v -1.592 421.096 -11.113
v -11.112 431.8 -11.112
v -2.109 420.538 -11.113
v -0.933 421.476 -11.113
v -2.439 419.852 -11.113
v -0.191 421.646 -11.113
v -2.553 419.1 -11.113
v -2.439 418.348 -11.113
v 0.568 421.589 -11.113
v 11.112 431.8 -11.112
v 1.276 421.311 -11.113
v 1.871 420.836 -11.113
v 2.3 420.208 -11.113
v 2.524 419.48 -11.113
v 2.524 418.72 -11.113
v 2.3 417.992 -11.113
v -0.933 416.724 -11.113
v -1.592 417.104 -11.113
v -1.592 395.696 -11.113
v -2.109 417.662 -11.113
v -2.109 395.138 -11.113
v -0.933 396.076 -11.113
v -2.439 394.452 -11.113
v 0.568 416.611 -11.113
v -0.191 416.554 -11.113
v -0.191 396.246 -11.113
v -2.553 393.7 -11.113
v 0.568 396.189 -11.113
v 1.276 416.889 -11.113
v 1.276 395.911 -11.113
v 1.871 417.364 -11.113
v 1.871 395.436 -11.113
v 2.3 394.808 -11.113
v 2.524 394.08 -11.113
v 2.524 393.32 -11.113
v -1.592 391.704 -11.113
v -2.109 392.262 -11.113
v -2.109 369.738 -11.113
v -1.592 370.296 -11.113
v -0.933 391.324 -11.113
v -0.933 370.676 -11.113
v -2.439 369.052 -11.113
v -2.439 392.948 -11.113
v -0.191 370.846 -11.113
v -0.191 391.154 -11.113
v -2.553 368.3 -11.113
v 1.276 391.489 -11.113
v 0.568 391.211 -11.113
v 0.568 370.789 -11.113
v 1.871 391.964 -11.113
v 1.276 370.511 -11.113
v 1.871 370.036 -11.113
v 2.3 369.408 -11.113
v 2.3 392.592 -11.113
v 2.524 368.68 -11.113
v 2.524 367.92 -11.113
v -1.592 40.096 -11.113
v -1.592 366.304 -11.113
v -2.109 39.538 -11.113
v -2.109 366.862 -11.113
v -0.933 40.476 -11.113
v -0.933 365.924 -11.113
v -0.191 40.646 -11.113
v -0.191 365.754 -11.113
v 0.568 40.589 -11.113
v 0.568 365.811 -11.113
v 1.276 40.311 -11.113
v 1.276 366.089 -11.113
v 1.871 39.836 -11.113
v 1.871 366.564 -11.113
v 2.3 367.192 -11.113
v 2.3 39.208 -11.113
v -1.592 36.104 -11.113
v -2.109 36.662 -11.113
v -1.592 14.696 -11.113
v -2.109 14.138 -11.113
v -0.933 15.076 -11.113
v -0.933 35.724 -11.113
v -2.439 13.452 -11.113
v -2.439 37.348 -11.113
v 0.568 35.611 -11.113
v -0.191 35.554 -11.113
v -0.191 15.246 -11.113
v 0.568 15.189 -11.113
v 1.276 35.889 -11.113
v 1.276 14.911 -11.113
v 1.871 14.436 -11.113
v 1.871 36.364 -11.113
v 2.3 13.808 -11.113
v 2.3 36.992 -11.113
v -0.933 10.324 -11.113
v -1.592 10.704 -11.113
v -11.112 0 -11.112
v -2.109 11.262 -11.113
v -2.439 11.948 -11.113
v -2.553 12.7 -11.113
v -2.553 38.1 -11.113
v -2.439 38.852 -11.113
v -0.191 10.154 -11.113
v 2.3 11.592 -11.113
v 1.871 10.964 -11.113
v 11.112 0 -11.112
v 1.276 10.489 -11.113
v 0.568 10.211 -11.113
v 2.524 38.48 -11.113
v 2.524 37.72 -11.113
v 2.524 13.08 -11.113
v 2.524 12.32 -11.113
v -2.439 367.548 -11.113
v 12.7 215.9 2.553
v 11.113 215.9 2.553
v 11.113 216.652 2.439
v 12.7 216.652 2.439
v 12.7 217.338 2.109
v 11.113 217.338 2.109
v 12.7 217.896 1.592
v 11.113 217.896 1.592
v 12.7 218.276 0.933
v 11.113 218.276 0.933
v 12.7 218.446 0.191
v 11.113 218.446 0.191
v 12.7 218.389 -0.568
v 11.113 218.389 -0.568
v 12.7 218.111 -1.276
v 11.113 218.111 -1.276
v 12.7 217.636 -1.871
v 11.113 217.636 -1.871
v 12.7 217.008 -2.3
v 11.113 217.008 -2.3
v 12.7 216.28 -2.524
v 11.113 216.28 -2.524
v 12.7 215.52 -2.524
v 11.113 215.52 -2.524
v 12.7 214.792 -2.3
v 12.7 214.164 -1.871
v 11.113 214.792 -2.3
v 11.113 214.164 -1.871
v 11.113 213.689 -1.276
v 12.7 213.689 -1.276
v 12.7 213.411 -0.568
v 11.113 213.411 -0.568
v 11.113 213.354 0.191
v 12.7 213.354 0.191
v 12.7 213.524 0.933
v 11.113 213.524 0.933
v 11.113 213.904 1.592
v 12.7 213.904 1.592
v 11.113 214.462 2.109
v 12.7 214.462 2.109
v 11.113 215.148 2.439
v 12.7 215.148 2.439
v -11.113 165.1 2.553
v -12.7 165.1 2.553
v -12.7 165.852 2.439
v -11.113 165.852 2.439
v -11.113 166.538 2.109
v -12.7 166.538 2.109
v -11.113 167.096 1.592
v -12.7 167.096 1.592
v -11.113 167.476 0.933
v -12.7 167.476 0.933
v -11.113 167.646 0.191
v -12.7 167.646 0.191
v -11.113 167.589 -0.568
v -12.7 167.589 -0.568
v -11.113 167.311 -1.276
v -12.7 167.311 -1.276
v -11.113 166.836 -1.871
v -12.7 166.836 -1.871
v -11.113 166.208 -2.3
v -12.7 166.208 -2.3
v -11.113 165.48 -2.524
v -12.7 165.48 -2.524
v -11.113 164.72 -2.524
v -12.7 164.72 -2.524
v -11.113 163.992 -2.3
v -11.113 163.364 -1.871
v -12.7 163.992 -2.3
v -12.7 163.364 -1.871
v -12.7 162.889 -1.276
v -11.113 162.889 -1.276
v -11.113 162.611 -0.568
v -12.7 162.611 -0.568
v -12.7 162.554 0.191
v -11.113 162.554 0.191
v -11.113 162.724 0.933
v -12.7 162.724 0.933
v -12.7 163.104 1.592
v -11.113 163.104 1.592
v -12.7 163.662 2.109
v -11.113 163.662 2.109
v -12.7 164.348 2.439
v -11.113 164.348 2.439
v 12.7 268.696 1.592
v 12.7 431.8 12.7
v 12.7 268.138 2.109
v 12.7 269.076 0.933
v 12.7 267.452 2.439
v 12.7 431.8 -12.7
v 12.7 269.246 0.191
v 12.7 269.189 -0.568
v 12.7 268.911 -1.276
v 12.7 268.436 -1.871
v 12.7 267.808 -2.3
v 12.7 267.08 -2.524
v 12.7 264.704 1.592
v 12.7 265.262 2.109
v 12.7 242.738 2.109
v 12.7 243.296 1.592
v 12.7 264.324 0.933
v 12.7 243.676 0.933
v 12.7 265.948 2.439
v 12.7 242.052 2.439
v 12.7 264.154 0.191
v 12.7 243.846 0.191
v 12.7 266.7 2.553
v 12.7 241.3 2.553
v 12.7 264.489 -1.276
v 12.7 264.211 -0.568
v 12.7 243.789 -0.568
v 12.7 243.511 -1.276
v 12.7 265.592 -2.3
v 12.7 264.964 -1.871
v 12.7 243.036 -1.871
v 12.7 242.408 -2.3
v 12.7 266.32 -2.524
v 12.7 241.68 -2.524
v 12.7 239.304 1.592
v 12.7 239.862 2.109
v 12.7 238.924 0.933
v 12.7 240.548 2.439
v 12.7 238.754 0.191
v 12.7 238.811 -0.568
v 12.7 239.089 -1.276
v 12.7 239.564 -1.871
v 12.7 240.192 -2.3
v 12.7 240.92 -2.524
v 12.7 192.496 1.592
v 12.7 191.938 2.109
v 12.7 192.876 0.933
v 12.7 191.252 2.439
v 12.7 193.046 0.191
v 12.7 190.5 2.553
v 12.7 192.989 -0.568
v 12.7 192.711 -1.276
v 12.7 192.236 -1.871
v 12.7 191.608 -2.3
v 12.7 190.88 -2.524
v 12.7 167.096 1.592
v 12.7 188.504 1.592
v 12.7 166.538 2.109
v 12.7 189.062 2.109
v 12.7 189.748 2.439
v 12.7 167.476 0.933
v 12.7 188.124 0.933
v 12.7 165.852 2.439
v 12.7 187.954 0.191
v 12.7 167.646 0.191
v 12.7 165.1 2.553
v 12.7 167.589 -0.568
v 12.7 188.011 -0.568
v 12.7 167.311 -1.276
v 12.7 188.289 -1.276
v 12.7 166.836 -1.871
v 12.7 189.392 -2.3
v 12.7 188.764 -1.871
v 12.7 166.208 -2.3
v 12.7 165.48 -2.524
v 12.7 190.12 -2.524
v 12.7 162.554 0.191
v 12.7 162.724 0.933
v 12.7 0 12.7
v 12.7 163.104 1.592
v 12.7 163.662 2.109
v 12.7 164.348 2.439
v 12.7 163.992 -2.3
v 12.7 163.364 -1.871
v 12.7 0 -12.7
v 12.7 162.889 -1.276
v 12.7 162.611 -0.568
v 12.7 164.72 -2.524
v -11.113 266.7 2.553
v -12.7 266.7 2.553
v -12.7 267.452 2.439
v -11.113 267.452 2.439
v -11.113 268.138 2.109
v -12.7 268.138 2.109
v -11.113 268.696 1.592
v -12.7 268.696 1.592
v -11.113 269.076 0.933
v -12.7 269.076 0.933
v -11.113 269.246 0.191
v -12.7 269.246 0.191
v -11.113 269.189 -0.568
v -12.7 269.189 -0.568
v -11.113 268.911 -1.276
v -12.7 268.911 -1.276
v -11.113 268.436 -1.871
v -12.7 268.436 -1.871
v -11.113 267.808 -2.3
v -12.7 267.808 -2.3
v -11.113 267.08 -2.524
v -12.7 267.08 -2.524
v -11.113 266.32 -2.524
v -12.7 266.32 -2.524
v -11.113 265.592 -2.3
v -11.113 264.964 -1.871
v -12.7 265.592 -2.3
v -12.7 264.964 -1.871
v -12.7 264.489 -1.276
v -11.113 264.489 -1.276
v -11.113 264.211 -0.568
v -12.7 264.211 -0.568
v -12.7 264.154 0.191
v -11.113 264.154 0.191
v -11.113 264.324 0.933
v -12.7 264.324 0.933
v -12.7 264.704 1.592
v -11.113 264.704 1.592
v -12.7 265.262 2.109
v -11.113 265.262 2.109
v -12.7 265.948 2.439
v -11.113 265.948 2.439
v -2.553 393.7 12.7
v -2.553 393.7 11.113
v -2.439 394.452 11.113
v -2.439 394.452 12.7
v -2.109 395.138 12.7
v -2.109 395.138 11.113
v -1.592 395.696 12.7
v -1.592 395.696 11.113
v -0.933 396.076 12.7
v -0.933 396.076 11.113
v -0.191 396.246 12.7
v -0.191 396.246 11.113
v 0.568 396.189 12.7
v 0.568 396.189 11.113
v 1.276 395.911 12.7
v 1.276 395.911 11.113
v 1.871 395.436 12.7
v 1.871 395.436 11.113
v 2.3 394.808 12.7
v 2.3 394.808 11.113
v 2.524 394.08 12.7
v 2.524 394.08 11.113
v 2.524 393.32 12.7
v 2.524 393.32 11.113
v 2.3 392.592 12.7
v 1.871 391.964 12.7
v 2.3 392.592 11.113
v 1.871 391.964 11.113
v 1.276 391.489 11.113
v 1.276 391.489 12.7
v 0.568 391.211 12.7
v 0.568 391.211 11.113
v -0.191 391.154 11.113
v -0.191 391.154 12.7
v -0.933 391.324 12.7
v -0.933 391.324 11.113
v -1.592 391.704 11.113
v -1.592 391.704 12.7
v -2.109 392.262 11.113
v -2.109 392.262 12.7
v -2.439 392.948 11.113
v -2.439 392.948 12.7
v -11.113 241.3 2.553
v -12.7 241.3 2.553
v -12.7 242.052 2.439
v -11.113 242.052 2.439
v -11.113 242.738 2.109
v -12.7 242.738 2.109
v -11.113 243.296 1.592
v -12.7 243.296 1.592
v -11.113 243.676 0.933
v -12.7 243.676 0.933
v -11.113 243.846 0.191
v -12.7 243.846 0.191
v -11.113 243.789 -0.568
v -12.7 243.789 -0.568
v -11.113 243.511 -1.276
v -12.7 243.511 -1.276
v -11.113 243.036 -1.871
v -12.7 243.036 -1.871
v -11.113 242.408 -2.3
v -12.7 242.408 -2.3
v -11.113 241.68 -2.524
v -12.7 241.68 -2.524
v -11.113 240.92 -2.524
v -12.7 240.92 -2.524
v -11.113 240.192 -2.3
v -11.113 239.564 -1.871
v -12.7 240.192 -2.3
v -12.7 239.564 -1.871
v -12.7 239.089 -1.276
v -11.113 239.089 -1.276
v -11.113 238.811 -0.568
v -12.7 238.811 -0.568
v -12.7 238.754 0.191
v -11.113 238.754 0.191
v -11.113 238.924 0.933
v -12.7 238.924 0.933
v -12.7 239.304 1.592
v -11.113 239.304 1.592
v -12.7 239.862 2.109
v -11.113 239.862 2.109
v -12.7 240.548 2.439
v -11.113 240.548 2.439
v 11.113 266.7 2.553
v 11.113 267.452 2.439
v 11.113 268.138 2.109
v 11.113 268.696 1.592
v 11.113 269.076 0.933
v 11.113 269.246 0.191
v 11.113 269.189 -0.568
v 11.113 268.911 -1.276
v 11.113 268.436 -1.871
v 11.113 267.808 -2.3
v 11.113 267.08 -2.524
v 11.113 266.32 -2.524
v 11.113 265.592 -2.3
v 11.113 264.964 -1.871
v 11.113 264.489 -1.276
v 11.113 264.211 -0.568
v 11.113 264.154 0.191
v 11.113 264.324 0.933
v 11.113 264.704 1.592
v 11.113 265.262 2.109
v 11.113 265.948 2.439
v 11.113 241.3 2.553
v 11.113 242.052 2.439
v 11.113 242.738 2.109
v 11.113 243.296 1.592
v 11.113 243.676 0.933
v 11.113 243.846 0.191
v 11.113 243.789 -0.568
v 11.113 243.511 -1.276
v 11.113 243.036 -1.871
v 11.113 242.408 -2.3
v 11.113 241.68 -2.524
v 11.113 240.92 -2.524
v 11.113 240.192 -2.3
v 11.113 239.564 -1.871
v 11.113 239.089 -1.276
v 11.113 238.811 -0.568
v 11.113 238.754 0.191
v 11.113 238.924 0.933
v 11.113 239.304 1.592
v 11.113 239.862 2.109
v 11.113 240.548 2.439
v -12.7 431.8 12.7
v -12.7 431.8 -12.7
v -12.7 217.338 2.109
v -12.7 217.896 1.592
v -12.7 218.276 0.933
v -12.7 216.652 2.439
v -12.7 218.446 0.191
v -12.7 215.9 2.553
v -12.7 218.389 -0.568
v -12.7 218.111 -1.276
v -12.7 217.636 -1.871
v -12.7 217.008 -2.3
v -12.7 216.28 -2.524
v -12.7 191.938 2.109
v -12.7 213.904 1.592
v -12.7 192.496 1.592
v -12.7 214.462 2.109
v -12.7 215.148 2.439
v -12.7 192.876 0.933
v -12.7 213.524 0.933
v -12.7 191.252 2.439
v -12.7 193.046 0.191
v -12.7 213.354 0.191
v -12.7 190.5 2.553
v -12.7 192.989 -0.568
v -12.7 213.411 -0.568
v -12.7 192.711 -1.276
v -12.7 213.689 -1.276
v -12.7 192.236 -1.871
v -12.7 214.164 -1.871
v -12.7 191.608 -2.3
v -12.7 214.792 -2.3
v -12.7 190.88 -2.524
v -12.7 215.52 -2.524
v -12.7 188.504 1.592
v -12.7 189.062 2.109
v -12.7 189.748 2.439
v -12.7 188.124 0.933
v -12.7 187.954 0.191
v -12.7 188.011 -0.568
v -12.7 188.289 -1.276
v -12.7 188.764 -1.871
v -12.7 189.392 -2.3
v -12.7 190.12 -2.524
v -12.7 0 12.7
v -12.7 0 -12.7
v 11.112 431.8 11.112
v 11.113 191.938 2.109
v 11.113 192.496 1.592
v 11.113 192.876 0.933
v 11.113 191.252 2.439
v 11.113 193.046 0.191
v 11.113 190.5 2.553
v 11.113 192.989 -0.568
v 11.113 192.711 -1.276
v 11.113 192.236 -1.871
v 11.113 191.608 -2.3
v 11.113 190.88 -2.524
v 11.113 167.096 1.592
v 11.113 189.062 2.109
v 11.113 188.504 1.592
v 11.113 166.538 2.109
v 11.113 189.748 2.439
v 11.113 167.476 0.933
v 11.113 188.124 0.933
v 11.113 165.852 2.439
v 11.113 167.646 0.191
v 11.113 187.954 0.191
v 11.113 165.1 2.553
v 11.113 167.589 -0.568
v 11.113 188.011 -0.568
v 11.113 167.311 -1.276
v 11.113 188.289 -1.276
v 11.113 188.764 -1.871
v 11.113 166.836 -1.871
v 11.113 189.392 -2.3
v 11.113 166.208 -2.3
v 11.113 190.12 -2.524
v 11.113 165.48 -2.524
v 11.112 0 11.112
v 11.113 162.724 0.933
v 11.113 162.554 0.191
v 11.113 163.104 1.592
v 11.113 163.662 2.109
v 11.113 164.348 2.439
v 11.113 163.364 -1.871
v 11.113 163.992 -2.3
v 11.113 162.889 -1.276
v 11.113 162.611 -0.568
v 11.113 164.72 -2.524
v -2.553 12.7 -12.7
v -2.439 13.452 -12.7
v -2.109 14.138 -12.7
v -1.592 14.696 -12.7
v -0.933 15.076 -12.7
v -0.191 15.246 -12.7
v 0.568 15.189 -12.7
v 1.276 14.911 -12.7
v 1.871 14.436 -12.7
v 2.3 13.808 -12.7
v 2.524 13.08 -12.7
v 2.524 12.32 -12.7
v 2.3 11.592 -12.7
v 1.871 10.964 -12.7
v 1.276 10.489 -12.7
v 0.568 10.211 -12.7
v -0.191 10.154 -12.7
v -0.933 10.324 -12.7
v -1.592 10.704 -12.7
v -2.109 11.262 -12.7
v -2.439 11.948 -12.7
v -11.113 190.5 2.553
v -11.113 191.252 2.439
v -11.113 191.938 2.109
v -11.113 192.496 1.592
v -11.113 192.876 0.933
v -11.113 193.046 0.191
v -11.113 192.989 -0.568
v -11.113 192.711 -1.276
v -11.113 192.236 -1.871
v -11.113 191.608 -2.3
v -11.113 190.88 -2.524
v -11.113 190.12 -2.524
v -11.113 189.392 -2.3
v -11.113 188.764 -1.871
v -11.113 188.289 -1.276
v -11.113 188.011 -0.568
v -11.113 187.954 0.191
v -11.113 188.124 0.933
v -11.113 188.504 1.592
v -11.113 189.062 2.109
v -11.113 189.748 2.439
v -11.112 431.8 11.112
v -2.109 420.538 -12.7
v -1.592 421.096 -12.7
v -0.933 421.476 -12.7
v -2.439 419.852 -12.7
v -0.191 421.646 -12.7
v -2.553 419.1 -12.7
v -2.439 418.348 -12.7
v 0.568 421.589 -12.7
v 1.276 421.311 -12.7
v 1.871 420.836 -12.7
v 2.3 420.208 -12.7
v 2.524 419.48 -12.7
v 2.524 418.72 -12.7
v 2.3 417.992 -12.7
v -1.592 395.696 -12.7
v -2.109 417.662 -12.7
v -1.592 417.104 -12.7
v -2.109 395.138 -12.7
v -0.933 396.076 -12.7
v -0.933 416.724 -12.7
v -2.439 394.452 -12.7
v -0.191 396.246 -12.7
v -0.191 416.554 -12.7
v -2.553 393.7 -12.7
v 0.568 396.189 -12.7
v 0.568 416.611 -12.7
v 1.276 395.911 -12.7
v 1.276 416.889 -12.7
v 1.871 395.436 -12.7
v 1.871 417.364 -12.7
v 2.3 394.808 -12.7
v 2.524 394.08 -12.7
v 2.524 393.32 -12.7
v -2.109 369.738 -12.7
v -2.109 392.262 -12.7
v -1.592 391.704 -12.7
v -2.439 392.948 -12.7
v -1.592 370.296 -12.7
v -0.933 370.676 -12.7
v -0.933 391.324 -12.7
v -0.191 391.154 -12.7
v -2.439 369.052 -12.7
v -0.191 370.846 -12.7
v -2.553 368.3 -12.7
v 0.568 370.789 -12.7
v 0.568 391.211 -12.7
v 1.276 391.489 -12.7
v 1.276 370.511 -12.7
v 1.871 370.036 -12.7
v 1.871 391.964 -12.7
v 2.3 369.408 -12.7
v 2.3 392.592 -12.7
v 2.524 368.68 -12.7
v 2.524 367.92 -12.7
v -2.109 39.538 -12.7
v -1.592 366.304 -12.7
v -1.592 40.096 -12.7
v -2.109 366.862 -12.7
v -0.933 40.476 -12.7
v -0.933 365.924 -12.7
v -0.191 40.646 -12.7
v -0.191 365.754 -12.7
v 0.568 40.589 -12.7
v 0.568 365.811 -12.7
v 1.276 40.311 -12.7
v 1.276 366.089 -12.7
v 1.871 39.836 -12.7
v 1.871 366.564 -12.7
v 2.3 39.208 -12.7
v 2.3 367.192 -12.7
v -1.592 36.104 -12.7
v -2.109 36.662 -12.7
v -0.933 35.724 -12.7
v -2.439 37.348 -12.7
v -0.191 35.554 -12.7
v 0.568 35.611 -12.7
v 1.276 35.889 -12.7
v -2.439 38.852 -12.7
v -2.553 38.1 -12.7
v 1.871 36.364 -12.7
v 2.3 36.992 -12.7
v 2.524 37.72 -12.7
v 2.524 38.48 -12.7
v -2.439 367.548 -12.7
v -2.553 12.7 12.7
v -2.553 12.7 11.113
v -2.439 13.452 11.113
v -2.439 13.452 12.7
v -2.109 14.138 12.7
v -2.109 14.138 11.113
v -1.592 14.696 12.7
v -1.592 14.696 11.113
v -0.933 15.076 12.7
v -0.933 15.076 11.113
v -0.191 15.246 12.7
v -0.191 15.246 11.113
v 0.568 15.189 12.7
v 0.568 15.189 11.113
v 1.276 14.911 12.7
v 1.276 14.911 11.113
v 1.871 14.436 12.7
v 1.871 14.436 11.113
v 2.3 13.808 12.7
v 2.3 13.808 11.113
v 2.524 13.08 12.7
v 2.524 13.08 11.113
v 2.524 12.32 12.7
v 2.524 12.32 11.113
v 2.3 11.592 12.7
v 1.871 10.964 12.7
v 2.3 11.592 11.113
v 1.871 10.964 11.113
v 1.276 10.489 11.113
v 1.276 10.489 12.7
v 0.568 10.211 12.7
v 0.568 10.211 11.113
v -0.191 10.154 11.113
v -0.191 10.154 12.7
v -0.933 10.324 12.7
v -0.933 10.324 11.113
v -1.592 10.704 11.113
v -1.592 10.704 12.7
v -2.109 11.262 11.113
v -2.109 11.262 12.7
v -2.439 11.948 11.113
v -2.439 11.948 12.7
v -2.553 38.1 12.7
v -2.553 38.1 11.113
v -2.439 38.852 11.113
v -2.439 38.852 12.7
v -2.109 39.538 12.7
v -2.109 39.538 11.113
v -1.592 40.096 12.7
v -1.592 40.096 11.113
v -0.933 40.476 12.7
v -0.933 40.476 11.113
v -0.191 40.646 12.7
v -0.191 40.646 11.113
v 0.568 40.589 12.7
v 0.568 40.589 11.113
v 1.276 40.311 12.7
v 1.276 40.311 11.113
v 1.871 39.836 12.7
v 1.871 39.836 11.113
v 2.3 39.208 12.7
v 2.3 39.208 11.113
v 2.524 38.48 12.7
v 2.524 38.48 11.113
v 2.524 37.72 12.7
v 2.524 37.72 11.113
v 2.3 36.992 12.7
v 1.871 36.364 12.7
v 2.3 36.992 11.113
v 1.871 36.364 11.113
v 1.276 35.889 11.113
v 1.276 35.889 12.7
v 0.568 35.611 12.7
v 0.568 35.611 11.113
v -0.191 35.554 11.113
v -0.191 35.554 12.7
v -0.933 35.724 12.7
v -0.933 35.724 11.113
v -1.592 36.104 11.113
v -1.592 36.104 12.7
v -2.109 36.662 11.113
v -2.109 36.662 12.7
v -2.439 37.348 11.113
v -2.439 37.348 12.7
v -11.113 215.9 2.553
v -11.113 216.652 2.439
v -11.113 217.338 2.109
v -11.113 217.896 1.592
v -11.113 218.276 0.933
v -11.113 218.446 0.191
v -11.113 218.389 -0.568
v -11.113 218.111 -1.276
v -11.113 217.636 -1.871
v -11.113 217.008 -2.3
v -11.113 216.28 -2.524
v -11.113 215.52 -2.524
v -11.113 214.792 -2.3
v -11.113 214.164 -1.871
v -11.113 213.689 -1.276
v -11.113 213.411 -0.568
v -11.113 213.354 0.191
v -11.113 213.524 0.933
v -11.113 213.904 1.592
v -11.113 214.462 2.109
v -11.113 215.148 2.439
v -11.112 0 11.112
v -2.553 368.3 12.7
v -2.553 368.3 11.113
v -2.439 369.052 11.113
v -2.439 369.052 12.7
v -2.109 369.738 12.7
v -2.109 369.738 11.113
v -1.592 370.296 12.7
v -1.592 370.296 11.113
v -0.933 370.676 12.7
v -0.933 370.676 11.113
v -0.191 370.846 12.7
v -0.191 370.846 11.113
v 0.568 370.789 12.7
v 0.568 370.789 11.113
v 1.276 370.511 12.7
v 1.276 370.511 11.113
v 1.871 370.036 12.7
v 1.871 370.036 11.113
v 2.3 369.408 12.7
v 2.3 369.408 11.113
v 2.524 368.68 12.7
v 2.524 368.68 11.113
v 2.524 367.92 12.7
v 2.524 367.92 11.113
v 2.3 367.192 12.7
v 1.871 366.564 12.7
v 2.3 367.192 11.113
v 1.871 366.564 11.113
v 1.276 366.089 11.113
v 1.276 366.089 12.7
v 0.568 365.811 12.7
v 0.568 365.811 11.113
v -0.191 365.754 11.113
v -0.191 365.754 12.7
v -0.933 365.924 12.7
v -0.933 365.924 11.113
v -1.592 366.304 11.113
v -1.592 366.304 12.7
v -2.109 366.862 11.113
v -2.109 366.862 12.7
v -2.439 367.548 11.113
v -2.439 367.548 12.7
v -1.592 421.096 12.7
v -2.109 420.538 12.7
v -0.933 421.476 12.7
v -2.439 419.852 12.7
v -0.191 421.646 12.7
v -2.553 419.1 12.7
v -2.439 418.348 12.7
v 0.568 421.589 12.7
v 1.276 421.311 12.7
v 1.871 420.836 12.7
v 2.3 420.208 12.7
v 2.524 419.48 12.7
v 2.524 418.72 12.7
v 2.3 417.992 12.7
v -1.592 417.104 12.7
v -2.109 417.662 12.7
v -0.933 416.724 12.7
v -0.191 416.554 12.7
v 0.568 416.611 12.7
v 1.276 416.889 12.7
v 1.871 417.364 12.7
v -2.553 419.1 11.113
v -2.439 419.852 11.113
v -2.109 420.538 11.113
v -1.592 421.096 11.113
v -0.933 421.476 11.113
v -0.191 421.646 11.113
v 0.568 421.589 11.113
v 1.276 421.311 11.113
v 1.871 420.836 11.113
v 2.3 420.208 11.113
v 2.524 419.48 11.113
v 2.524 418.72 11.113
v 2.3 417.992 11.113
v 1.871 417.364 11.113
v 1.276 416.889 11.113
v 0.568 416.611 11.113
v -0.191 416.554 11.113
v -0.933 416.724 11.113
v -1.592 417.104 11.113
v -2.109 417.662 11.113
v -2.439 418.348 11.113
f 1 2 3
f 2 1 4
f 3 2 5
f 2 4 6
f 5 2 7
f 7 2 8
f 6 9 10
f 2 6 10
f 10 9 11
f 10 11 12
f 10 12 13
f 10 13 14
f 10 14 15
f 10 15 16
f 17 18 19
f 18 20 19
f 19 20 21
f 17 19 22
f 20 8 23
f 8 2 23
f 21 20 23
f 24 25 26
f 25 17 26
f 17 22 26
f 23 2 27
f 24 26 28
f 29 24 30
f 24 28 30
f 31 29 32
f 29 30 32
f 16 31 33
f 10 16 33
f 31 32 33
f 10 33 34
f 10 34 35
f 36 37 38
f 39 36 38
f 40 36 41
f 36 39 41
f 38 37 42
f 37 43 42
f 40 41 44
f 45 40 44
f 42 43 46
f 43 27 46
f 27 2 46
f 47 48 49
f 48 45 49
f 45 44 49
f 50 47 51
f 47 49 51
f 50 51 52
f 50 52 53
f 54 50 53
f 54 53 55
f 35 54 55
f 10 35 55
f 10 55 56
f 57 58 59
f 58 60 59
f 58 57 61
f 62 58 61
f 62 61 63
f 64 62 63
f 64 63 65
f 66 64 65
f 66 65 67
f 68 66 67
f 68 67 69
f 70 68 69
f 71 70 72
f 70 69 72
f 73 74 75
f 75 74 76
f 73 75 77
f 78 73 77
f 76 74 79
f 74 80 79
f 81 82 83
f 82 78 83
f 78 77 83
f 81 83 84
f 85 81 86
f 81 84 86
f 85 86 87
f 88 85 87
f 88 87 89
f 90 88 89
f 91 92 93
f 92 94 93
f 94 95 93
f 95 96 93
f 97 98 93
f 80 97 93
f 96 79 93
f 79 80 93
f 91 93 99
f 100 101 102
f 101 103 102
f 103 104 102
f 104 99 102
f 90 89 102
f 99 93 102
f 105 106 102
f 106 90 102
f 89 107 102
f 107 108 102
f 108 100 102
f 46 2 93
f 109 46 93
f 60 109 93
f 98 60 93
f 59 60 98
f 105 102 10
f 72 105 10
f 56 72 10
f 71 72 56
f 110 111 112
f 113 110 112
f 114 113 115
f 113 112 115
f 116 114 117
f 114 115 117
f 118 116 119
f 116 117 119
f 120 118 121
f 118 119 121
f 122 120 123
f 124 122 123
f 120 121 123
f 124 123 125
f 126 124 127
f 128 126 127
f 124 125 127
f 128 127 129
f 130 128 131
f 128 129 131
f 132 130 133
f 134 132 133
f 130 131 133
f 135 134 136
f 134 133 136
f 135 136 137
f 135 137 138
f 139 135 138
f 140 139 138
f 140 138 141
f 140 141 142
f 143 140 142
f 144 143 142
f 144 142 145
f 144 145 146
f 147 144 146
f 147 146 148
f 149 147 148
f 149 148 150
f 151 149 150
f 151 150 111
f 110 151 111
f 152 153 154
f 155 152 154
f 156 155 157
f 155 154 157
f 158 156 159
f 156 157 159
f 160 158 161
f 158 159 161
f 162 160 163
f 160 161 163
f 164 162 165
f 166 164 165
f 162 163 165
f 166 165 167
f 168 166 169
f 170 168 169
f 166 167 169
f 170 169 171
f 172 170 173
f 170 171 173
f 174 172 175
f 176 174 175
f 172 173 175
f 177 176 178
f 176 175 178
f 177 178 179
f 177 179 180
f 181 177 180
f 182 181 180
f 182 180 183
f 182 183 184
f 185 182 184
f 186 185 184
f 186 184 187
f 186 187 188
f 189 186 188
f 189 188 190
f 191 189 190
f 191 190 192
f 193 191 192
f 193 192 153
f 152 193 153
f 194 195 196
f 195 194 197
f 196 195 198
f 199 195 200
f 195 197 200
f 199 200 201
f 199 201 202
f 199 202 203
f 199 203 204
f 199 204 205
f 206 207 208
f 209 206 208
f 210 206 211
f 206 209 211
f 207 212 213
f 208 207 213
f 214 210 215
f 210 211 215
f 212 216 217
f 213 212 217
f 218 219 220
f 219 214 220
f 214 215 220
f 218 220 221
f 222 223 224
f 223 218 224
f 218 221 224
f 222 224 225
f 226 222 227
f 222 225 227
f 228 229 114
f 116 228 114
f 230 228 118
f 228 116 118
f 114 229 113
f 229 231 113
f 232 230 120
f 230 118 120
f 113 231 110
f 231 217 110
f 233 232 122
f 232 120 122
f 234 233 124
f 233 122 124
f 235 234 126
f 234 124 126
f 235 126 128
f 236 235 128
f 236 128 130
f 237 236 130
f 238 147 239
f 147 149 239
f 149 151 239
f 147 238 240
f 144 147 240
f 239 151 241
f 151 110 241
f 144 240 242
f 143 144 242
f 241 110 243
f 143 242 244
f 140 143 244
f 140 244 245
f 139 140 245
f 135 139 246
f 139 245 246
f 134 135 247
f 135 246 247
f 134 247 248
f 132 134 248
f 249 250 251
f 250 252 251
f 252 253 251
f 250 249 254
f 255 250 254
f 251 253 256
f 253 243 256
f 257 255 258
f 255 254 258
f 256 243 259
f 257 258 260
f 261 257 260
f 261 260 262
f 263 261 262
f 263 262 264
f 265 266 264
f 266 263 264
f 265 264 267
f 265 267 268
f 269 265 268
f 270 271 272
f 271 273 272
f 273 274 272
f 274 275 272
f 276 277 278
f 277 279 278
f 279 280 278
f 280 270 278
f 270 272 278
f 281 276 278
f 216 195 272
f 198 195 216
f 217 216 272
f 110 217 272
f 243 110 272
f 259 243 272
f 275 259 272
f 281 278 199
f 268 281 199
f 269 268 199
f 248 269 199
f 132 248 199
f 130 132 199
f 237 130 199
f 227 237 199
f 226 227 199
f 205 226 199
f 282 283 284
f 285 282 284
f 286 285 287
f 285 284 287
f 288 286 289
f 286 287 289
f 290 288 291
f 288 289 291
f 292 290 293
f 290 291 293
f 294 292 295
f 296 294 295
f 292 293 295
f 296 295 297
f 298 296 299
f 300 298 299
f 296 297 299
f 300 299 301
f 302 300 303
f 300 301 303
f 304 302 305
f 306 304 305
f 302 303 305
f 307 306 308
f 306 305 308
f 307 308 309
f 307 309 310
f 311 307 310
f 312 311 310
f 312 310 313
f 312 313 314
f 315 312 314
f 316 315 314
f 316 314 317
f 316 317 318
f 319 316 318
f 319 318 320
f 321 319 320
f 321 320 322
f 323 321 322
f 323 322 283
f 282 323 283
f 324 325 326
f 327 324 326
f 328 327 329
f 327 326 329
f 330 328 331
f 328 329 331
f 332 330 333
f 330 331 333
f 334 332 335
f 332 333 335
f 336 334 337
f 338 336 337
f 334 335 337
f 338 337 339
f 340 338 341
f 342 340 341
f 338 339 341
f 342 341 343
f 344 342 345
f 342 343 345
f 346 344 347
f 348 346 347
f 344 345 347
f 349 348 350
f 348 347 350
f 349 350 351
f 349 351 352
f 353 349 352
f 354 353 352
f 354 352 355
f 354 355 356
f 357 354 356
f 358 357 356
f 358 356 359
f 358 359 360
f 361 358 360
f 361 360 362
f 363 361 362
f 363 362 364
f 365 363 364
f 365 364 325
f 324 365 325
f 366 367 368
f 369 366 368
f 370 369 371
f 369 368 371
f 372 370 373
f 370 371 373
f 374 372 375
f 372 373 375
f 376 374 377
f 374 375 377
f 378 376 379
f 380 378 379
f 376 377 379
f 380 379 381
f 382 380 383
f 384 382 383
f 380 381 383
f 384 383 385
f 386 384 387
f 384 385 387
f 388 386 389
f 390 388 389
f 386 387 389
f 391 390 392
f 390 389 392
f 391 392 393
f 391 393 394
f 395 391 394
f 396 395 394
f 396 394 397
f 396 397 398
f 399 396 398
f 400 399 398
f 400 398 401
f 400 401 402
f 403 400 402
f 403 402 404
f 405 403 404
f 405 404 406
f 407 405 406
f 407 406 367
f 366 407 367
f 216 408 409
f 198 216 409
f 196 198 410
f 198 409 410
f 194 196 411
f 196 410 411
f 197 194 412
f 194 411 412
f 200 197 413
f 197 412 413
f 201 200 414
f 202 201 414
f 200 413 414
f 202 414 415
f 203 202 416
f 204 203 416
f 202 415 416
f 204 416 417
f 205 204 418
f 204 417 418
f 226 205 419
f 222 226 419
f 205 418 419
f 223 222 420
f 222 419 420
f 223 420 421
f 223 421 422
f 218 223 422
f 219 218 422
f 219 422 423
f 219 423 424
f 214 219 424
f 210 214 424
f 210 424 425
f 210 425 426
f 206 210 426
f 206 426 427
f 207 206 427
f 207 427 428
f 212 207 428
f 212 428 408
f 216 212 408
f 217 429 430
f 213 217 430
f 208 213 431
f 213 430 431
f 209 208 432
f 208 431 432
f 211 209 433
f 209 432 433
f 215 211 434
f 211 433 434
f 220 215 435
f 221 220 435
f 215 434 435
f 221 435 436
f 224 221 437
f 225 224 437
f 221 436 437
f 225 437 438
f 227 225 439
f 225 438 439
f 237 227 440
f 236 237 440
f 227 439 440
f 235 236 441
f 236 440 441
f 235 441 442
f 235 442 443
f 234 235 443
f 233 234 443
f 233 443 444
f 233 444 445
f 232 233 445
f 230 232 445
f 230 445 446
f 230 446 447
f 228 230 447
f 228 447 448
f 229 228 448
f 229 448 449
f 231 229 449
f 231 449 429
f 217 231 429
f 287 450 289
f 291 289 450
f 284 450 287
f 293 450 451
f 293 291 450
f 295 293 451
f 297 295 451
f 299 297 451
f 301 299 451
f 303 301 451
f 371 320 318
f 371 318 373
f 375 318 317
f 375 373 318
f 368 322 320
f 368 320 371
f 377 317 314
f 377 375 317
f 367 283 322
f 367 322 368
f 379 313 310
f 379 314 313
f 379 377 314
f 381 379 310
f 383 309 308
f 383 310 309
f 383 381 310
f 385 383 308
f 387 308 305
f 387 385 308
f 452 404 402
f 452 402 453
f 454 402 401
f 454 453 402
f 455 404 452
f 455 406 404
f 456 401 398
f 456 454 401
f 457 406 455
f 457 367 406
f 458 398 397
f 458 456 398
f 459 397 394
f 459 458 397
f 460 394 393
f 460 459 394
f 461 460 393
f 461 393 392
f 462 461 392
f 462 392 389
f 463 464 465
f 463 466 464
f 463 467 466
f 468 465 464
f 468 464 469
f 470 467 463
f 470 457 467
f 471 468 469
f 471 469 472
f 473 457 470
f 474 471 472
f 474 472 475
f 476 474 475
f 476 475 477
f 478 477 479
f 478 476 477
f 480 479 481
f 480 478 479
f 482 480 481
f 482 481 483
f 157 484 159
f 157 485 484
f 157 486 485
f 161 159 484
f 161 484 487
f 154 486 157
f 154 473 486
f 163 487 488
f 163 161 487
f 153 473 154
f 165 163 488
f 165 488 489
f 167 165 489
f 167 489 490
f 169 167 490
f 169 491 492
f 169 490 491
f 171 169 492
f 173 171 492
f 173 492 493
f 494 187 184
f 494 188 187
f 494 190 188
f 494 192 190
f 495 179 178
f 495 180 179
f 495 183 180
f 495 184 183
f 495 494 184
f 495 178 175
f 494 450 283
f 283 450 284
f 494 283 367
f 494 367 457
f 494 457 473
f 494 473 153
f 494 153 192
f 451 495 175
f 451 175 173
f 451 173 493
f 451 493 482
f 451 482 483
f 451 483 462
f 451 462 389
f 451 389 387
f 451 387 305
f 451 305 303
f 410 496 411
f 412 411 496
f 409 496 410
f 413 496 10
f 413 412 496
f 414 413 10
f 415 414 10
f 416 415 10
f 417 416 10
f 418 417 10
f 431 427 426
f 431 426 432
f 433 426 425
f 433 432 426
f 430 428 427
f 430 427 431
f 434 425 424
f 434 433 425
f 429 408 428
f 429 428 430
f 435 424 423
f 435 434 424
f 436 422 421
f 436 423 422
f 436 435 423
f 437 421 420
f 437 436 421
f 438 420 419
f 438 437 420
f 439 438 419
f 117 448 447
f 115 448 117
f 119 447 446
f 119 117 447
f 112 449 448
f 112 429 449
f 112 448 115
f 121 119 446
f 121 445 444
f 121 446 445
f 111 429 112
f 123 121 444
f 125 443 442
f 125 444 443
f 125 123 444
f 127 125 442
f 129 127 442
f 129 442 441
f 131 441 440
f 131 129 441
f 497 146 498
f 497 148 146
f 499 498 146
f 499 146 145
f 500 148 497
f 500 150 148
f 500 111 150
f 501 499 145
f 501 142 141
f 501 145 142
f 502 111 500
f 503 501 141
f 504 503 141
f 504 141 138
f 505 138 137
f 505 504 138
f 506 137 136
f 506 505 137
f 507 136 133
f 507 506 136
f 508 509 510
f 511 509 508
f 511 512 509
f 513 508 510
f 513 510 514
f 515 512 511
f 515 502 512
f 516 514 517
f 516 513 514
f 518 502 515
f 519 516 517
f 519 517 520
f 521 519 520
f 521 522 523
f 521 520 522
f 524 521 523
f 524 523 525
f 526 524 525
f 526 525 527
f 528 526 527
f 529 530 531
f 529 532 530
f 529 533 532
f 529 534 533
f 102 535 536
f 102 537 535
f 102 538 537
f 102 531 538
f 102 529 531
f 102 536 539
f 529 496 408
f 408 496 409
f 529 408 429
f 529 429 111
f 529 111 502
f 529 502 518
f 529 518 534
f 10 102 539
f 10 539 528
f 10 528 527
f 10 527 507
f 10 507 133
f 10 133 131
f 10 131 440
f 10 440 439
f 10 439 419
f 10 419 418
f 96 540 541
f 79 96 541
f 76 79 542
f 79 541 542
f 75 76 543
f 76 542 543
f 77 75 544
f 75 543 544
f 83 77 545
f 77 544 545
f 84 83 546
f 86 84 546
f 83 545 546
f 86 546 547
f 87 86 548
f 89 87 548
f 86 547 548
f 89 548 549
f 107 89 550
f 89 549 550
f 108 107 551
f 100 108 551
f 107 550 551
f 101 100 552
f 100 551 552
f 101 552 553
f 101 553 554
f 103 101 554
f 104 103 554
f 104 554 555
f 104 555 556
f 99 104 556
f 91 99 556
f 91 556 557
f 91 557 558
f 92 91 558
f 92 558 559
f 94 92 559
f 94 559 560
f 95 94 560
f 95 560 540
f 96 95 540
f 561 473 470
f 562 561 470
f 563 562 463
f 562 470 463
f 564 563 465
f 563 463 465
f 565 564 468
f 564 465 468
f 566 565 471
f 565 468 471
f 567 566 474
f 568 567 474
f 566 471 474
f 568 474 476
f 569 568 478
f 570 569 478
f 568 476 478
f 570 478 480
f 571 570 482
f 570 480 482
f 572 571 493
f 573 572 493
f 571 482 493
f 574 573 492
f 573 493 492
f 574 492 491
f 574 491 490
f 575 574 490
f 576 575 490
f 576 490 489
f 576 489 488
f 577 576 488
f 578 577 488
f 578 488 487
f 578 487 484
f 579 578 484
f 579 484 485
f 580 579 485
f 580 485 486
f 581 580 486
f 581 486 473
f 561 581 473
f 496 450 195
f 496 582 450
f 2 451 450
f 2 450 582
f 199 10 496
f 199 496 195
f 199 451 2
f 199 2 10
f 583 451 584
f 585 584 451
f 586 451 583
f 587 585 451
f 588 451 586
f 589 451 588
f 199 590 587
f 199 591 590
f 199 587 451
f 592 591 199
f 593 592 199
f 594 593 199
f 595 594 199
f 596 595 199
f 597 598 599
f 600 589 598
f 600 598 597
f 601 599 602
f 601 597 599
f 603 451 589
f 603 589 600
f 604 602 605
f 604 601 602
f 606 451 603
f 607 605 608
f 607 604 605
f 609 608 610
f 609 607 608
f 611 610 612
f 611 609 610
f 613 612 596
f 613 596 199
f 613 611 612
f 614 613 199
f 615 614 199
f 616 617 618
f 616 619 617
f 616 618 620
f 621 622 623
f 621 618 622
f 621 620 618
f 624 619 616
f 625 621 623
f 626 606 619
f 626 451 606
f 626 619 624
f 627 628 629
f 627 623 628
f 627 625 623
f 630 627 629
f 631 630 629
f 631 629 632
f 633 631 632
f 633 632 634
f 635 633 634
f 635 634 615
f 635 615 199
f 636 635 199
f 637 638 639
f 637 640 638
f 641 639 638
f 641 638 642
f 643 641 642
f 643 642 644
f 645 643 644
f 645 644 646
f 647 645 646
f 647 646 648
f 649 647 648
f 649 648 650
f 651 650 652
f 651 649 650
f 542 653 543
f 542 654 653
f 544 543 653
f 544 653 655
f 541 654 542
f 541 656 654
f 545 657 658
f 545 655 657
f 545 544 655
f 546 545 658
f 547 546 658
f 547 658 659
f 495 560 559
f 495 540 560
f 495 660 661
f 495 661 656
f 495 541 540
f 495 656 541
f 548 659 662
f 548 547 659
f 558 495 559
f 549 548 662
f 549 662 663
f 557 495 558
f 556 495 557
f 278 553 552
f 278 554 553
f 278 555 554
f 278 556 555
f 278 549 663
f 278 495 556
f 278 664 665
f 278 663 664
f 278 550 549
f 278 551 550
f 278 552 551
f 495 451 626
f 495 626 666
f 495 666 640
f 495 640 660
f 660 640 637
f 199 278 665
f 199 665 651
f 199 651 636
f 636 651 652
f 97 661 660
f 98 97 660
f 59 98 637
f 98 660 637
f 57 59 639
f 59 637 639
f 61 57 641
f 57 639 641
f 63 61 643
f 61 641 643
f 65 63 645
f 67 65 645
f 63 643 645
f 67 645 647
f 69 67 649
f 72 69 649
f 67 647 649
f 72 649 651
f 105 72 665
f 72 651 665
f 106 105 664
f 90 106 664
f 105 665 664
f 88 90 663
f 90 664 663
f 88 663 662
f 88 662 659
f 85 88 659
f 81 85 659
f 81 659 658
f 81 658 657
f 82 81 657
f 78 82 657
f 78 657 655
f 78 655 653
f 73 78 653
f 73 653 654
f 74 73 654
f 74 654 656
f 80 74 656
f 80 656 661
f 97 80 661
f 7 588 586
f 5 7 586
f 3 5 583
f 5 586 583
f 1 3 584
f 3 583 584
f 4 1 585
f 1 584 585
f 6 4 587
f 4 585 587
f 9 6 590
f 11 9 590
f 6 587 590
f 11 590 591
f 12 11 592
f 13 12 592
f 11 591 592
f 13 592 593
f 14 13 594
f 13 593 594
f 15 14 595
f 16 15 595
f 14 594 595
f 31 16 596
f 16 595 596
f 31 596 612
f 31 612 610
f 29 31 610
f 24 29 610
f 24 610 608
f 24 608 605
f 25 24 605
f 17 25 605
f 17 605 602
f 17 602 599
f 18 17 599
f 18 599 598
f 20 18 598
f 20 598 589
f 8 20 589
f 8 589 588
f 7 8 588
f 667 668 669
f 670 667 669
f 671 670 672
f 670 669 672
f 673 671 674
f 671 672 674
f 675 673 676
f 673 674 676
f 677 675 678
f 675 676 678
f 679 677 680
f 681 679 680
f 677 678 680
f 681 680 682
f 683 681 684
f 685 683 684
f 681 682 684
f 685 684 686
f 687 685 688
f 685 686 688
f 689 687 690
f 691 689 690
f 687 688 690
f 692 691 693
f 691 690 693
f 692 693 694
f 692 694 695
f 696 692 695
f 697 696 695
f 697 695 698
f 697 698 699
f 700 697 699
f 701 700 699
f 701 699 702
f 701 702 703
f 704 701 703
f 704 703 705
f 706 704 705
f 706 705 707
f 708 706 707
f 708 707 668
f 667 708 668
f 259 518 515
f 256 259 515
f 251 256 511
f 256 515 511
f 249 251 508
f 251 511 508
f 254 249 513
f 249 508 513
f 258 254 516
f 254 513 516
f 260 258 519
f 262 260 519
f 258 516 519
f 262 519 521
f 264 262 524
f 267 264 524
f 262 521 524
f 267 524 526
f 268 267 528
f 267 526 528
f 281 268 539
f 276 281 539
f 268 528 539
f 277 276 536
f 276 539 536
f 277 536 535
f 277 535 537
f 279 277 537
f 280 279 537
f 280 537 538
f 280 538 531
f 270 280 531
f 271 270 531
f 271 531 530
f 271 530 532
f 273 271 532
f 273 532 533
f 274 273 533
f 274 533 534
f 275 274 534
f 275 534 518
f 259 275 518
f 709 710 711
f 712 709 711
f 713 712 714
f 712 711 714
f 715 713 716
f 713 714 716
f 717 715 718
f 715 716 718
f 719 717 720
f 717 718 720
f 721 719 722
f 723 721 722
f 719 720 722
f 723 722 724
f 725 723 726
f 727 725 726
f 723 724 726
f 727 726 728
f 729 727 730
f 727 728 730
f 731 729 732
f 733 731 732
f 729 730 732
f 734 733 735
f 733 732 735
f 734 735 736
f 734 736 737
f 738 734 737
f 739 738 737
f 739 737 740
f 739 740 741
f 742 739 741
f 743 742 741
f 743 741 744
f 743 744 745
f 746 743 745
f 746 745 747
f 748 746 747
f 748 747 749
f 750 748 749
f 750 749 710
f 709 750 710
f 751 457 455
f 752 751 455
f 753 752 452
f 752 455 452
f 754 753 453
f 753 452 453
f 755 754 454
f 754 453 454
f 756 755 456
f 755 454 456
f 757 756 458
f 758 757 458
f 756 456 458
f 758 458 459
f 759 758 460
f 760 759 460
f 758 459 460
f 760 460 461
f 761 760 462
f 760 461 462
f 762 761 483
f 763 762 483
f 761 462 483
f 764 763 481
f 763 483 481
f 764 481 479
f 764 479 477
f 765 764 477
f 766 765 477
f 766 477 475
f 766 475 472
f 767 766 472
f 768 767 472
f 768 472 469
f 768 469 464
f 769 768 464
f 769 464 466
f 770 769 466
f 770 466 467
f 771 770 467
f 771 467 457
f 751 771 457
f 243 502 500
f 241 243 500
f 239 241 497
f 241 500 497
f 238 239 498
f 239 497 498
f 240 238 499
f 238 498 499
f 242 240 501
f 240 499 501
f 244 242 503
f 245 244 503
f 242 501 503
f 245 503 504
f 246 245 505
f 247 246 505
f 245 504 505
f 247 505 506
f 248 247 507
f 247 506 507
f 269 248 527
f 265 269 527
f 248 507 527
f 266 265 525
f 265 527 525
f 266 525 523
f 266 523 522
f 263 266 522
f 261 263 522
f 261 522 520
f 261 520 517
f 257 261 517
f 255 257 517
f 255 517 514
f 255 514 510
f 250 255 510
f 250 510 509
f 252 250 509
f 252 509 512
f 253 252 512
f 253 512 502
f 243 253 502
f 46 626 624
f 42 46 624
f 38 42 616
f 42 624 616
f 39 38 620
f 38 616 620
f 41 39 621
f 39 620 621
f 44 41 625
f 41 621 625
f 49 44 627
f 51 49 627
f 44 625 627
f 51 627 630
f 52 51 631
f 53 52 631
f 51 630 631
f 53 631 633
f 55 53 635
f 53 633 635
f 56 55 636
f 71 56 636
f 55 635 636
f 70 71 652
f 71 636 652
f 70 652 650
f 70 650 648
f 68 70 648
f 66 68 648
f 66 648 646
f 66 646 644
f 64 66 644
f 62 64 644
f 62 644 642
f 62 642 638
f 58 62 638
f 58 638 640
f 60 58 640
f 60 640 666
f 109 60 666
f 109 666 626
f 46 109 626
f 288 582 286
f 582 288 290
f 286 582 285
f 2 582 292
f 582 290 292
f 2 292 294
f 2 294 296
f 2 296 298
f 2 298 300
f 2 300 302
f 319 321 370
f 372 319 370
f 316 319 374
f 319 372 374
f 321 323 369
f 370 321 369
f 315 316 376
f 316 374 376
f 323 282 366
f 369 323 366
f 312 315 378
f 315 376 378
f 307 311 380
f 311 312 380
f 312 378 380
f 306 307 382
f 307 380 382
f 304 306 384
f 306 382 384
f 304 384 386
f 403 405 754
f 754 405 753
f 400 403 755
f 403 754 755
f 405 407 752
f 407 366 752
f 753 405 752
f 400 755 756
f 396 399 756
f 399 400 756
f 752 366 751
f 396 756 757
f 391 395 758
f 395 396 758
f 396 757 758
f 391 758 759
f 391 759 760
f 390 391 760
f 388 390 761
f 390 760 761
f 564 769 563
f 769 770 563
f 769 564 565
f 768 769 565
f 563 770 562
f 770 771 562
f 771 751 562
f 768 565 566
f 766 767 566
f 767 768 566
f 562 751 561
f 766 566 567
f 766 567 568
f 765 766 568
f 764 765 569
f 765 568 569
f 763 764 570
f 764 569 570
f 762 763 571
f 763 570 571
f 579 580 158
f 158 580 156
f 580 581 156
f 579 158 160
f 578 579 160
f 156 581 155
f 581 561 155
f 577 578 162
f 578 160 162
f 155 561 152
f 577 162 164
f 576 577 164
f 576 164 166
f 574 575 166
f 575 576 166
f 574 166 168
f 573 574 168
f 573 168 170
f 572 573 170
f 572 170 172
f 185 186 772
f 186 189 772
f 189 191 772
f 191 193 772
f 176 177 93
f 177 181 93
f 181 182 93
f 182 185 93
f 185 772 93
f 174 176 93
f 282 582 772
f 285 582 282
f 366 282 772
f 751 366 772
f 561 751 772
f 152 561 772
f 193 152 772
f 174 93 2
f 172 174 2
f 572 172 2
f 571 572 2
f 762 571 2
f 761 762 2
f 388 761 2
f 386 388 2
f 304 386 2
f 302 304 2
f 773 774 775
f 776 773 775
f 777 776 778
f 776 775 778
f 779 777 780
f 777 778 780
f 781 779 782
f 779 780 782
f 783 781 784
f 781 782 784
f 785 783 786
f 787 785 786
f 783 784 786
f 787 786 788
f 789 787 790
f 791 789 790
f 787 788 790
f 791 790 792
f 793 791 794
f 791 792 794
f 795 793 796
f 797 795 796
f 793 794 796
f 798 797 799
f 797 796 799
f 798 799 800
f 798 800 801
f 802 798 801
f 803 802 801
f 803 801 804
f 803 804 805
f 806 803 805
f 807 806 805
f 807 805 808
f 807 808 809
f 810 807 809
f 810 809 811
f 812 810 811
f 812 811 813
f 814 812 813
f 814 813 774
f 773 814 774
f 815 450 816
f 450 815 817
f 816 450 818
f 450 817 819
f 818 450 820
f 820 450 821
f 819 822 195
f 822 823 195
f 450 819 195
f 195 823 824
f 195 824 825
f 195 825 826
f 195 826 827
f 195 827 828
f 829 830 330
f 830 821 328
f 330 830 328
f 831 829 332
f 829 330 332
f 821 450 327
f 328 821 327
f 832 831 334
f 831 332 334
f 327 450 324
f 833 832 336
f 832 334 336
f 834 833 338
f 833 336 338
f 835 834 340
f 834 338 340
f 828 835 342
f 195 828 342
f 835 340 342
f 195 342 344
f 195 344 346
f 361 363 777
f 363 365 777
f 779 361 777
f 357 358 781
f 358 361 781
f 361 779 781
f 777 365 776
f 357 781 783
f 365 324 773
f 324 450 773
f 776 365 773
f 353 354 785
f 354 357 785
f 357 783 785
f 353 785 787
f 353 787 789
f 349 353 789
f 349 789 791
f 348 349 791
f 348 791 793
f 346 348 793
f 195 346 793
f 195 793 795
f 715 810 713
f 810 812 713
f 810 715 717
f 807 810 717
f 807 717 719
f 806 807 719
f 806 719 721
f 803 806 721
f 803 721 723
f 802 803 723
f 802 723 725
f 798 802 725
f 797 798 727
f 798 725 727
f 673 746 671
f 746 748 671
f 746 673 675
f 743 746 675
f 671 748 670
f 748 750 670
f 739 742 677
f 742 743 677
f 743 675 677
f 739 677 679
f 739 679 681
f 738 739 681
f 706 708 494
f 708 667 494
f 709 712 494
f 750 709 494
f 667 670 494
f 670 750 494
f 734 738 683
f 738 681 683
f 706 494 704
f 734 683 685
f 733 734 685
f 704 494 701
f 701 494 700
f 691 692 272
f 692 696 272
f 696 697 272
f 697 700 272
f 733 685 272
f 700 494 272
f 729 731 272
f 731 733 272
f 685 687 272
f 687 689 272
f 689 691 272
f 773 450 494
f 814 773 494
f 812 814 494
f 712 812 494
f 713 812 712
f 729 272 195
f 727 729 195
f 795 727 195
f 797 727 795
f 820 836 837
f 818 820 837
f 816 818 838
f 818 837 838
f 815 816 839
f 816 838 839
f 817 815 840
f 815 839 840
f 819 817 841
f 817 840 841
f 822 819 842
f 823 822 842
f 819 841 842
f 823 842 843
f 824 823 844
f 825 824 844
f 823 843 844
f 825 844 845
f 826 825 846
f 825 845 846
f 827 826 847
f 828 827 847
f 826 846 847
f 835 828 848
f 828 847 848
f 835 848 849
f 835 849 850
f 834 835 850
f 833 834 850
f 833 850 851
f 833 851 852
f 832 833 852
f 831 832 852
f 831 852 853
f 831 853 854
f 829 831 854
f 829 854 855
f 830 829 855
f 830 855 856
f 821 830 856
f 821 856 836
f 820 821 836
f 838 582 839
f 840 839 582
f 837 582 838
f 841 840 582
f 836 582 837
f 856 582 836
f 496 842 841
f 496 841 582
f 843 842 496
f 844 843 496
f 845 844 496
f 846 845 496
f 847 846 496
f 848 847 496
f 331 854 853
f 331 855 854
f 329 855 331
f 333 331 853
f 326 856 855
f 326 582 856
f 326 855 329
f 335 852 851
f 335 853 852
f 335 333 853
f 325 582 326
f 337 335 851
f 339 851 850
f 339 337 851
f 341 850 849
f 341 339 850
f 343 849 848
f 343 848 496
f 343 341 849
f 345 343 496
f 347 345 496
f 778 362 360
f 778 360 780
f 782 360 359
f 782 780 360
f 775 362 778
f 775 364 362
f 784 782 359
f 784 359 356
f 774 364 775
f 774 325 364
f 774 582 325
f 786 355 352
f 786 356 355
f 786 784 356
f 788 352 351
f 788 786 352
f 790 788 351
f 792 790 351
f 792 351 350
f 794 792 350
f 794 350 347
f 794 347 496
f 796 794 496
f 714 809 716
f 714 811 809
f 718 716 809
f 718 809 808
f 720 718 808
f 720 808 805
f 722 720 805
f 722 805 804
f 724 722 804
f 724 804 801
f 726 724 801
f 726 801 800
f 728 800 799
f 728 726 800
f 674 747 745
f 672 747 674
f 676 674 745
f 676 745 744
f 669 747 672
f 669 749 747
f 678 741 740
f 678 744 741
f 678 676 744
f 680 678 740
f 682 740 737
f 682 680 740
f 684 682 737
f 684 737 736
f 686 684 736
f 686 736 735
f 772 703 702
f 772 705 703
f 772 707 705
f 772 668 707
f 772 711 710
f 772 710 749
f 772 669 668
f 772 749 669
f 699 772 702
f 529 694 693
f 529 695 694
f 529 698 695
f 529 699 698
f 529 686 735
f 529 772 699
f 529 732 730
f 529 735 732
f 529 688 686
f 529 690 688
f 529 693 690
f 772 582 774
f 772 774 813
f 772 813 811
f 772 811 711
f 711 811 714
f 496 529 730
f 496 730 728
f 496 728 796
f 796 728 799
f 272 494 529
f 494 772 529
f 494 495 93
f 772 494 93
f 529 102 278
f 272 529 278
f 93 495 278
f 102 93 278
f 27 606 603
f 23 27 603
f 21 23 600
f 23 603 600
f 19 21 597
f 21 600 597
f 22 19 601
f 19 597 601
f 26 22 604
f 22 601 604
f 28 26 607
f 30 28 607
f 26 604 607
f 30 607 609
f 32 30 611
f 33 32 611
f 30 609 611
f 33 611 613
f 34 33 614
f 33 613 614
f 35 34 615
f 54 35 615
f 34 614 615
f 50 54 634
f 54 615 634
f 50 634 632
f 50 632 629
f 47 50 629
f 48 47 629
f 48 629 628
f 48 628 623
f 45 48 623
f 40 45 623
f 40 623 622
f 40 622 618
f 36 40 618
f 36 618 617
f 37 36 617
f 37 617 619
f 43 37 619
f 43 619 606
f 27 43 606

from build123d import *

# Parameters (mm, degrees)
SKETCH1_W                  = 25.4
SKETCH1_H                  = 25.4
SKETCH1_W_2                = 22.225
SKETCH1_H_2                = 22.225
BOSS_EXTRUDE1_DEPTH        = 431.8
F_7_0_201_DIAMETER_HOLE1_D = 5.1054
F_7_0_201_DIAMETER_HOLE2_D = 5.1054


with BuildPart() as part:
    # Sketch1 → Boss-Extrude1 (new body)
    with BuildSketch(Plane(origin=(0, 0, 0), x_dir=(1, 0, 0), z_dir=(0, 1, 0))):
        Rectangle(SKETCH1_W, SKETCH1_H)
        Rectangle(SKETCH1_W_2, SKETCH1_H_2, mode=Mode.SUBTRACT)
    extrude(amount=BOSS_EXTRUDE1_DEPTH)

    # #7 (0.201) Diameter Hole1 (through all)
    with Locations(Plane.XY.offset(12.7)):
        with Locations((0, 12.7), (0, 38.1), (0, 368.3), (0, 393.7), (0, 419.1)):
            Hole(F_7_0_201_DIAMETER_HOLE1_D / 2)

    # #7 (0.201) Diameter Hole2 (through all)
    with Locations(Plane(origin=(12.7, 0, 0), x_dir=(0, 0, -1), z_dir=(1, 0, 0))):
        with Locations((0, 165.1), (0, 190.5), (0, 215.9), (0, 241.3), (0, 266.7)):
            Hole(F_7_0_201_DIAMETER_HOLE2_D / 2)


solid = part.part
